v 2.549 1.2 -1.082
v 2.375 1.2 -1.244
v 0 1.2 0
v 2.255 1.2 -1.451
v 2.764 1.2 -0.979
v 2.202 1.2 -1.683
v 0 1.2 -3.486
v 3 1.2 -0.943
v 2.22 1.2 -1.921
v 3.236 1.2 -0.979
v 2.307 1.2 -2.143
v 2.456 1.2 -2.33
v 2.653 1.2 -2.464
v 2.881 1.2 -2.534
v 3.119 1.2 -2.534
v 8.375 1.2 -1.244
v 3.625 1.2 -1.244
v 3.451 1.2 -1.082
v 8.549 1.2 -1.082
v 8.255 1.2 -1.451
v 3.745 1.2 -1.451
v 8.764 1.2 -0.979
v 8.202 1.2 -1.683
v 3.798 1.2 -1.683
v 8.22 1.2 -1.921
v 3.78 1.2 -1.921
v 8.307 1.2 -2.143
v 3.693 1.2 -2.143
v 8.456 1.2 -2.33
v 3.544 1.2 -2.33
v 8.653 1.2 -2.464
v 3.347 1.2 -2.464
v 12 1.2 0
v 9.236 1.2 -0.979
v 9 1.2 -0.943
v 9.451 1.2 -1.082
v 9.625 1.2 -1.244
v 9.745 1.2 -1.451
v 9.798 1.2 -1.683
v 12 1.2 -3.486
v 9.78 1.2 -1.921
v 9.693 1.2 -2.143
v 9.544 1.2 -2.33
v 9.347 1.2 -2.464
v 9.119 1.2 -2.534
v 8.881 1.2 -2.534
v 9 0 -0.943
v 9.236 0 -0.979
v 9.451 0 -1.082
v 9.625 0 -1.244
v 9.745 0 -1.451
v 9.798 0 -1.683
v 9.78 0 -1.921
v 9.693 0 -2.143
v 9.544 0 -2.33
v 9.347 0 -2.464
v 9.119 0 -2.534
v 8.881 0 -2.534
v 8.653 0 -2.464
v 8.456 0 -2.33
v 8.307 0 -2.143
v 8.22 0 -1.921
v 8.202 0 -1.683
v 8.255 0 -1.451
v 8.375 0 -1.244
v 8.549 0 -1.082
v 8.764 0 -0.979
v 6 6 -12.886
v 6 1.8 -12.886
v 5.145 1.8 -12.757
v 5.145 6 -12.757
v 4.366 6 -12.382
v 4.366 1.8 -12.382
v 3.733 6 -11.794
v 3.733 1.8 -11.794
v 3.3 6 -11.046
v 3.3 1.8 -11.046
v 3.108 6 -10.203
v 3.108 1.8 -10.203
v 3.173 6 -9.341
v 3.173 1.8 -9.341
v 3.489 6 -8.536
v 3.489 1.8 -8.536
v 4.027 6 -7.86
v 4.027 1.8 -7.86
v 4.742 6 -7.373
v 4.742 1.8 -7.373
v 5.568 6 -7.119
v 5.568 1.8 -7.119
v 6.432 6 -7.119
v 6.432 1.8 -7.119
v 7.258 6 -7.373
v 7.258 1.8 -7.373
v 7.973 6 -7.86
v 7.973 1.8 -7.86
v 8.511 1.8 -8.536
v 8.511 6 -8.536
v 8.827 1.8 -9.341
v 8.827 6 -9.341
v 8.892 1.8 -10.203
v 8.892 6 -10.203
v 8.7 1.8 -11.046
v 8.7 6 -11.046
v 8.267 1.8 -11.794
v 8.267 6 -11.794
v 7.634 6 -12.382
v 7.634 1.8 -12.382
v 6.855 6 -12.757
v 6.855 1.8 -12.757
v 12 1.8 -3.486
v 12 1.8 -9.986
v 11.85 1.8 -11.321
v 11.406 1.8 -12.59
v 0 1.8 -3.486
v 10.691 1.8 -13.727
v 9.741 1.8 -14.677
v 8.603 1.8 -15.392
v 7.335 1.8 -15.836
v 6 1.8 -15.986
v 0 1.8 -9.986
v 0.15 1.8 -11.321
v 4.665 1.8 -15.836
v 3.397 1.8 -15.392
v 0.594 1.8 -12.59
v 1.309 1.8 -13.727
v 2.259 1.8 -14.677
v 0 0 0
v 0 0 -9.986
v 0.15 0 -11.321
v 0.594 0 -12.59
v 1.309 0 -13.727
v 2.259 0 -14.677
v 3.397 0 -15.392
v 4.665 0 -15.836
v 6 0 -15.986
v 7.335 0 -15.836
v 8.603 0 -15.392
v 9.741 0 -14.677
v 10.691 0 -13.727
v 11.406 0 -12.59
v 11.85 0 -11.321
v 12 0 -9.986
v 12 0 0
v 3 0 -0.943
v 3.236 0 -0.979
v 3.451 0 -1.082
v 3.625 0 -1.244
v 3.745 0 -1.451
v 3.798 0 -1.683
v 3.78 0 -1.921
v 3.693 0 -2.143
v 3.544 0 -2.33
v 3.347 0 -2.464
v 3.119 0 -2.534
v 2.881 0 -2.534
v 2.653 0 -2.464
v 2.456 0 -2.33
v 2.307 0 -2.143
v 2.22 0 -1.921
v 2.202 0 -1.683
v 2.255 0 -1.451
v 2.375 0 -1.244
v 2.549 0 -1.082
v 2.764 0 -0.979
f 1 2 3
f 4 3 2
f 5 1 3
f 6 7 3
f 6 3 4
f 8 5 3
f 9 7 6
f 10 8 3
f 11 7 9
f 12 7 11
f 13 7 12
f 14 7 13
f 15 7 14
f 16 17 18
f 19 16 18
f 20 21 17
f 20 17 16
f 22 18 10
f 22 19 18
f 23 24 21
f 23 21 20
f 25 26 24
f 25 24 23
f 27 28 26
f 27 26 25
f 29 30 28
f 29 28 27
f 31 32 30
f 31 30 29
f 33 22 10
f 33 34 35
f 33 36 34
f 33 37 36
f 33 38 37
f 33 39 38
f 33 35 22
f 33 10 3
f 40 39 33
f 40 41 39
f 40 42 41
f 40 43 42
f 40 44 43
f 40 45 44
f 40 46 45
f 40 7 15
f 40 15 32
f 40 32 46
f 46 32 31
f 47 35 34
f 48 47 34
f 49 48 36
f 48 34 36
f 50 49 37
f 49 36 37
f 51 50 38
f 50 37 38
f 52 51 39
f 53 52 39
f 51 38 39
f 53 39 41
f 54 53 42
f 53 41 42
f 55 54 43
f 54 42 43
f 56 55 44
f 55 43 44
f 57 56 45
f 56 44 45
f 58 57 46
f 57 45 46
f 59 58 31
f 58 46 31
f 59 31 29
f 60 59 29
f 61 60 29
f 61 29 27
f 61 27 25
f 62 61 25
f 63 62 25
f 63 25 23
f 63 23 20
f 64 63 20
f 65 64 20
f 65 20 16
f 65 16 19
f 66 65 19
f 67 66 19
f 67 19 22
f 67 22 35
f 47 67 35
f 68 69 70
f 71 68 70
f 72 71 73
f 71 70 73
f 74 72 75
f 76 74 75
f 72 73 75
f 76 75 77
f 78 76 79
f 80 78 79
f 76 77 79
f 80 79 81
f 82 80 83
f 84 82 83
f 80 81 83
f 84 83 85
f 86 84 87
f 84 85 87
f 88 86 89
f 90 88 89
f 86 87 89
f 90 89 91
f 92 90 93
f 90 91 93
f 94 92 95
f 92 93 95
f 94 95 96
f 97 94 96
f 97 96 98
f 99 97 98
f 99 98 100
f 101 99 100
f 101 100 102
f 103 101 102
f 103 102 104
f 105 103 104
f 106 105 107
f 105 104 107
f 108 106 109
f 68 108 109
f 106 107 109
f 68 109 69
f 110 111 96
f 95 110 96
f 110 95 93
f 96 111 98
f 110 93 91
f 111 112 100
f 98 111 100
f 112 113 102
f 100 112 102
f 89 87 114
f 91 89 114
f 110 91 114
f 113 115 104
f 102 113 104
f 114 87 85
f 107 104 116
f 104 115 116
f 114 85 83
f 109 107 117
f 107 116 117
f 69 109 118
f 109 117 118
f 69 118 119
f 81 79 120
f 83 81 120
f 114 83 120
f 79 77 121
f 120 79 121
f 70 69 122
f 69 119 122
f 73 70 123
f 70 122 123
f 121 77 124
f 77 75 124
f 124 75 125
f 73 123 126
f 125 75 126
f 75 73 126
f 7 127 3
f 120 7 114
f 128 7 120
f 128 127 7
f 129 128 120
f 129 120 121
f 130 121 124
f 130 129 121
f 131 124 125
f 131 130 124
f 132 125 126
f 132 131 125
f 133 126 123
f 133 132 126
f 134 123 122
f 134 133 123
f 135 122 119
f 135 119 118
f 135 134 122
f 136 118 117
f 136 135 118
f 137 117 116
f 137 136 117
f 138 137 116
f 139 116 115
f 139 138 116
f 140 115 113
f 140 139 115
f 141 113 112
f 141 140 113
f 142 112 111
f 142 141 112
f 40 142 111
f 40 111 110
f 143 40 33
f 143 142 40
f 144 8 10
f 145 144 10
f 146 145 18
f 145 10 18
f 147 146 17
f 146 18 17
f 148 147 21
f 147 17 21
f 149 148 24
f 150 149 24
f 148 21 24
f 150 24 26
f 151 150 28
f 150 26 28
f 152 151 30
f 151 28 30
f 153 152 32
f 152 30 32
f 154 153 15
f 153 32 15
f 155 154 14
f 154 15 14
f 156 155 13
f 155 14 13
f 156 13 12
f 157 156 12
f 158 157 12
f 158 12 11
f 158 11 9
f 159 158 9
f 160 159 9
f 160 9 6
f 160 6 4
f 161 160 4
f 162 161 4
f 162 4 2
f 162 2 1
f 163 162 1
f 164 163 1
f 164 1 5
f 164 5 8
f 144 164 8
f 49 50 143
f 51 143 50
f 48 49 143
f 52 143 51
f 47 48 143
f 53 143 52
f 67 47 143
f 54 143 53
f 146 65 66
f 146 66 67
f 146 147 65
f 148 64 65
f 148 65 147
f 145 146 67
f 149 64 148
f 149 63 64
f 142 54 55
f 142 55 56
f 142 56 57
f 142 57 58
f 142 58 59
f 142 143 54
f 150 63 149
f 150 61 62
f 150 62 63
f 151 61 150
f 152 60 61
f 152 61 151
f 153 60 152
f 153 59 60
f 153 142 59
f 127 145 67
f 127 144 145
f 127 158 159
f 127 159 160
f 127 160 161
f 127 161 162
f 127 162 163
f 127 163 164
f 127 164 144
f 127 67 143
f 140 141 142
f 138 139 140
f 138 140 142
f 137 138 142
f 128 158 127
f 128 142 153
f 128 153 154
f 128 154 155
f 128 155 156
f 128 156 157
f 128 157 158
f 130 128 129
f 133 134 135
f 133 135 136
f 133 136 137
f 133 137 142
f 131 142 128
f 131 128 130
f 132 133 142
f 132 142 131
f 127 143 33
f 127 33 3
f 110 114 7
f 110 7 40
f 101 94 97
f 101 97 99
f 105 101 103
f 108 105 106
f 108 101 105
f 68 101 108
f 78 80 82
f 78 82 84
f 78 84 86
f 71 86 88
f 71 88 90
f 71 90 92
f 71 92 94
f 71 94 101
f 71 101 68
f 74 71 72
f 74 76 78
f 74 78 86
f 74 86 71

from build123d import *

# Parameters (mm, degrees)
BOSS_EXTRUDE1_DEPTH = 1.8
SKETCH3_W           = 12
SKETCH3_H           = 3.48629
CUT_EXTRUDE1_DEPTH  = 0.6
SKETCH4_R           = 2.9
BOSS_EXTRUDE2_DEPTH = 4.2
CUT_EXTRUDE2_REACH  = 22.557
SKETCH5_R           = 0.8


with BuildPart() as part:
    # Sketch2 → Boss-Extrude1 (new body)
    with BuildSketch(Plane(origin=(0, 0, 0), x_dir=(1, 0, 0), z_dir=(0, 1, 0))):
        with BuildLine():
            Line((0, 0), (0, 9.98629))
            ThreePointArc((0, 9.98629), (6, 15.98629), (12, 9.98629))
            Line((12, 9.98629), (12, 0))
            Line((12, 0), (0, 0))
        make_face()
    extrude(amount=BOSS_EXTRUDE1_DEPTH)

    # Sketch3 → Cut-Extrude1 (cut)
    with BuildSketch(Plane(origin=(0, 1.8, 0), x_dir=(1, 0, 0), z_dir=(0, 1, 0))):
        with Locations((6, 1.743145)):
            Rectangle(SKETCH3_W, SKETCH3_H)
    extrude(amount=-CUT_EXTRUDE1_DEPTH, mode=Mode.SUBTRACT)

    # Sketch4 → Boss-Extrude2 (add)
    with BuildSketch(Plane(origin=(0, 1.8, 0), x_dir=(1, 0, 0), z_dir=(0, 1, 0))):
        with Locations(Location((6, 9.98629, 0), (0, 0, 90))):
            Circle(SKETCH4_R)
    extrude(amount=BOSS_EXTRUDE2_DEPTH)

    # Sketch5 → Cut-Extrude2 (cut, up to next)
    with BuildSketch(Plane(origin=(0, 1.2, 0), x_dir=(1, 0, 0), z_dir=(0, 1, 0)), mode=Mode.PRIVATE) as cut_extrude2_sk1:
        with Locations(Location((3, 1.743145, 0), (0, 0, 270))):
            Circle(SKETCH5_R)
    cut_extrude2_tool1 = extrude(cut_extrude2_sk1.sketch, amount=-CUT_EXTRUDE2_REACH, mode=Mode.PRIVATE) & part.part
    # Sketch5 → Cut-Extrude2 (cut, up to next)
    with BuildSketch(Plane(origin=(0, 1.2, 0), x_dir=(1, 0, 0), z_dir=(0, 1, 0)), mode=Mode.PRIVATE) as cut_extrude2_sk2:
        with Locations(Location((9, 1.743145, 0), (0, 0, 270))):
            Circle(SKETCH5_R)
    cut_extrude2_tool2 = extrude(cut_extrude2_sk2.sketch, amount=-CUT_EXTRUDE2_REACH, mode=Mode.PRIVATE) & part.part
    add(cut_extrude2_tool1.solids().sort_by_distance((3, 1.2, -1.743145))[0], mode=Mode.SUBTRACT)
    add(cut_extrude2_tool2.solids().sort_by_distance((9, 1.2, -1.743145))[0], mode=Mode.SUBTRACT)


solid = part.part
